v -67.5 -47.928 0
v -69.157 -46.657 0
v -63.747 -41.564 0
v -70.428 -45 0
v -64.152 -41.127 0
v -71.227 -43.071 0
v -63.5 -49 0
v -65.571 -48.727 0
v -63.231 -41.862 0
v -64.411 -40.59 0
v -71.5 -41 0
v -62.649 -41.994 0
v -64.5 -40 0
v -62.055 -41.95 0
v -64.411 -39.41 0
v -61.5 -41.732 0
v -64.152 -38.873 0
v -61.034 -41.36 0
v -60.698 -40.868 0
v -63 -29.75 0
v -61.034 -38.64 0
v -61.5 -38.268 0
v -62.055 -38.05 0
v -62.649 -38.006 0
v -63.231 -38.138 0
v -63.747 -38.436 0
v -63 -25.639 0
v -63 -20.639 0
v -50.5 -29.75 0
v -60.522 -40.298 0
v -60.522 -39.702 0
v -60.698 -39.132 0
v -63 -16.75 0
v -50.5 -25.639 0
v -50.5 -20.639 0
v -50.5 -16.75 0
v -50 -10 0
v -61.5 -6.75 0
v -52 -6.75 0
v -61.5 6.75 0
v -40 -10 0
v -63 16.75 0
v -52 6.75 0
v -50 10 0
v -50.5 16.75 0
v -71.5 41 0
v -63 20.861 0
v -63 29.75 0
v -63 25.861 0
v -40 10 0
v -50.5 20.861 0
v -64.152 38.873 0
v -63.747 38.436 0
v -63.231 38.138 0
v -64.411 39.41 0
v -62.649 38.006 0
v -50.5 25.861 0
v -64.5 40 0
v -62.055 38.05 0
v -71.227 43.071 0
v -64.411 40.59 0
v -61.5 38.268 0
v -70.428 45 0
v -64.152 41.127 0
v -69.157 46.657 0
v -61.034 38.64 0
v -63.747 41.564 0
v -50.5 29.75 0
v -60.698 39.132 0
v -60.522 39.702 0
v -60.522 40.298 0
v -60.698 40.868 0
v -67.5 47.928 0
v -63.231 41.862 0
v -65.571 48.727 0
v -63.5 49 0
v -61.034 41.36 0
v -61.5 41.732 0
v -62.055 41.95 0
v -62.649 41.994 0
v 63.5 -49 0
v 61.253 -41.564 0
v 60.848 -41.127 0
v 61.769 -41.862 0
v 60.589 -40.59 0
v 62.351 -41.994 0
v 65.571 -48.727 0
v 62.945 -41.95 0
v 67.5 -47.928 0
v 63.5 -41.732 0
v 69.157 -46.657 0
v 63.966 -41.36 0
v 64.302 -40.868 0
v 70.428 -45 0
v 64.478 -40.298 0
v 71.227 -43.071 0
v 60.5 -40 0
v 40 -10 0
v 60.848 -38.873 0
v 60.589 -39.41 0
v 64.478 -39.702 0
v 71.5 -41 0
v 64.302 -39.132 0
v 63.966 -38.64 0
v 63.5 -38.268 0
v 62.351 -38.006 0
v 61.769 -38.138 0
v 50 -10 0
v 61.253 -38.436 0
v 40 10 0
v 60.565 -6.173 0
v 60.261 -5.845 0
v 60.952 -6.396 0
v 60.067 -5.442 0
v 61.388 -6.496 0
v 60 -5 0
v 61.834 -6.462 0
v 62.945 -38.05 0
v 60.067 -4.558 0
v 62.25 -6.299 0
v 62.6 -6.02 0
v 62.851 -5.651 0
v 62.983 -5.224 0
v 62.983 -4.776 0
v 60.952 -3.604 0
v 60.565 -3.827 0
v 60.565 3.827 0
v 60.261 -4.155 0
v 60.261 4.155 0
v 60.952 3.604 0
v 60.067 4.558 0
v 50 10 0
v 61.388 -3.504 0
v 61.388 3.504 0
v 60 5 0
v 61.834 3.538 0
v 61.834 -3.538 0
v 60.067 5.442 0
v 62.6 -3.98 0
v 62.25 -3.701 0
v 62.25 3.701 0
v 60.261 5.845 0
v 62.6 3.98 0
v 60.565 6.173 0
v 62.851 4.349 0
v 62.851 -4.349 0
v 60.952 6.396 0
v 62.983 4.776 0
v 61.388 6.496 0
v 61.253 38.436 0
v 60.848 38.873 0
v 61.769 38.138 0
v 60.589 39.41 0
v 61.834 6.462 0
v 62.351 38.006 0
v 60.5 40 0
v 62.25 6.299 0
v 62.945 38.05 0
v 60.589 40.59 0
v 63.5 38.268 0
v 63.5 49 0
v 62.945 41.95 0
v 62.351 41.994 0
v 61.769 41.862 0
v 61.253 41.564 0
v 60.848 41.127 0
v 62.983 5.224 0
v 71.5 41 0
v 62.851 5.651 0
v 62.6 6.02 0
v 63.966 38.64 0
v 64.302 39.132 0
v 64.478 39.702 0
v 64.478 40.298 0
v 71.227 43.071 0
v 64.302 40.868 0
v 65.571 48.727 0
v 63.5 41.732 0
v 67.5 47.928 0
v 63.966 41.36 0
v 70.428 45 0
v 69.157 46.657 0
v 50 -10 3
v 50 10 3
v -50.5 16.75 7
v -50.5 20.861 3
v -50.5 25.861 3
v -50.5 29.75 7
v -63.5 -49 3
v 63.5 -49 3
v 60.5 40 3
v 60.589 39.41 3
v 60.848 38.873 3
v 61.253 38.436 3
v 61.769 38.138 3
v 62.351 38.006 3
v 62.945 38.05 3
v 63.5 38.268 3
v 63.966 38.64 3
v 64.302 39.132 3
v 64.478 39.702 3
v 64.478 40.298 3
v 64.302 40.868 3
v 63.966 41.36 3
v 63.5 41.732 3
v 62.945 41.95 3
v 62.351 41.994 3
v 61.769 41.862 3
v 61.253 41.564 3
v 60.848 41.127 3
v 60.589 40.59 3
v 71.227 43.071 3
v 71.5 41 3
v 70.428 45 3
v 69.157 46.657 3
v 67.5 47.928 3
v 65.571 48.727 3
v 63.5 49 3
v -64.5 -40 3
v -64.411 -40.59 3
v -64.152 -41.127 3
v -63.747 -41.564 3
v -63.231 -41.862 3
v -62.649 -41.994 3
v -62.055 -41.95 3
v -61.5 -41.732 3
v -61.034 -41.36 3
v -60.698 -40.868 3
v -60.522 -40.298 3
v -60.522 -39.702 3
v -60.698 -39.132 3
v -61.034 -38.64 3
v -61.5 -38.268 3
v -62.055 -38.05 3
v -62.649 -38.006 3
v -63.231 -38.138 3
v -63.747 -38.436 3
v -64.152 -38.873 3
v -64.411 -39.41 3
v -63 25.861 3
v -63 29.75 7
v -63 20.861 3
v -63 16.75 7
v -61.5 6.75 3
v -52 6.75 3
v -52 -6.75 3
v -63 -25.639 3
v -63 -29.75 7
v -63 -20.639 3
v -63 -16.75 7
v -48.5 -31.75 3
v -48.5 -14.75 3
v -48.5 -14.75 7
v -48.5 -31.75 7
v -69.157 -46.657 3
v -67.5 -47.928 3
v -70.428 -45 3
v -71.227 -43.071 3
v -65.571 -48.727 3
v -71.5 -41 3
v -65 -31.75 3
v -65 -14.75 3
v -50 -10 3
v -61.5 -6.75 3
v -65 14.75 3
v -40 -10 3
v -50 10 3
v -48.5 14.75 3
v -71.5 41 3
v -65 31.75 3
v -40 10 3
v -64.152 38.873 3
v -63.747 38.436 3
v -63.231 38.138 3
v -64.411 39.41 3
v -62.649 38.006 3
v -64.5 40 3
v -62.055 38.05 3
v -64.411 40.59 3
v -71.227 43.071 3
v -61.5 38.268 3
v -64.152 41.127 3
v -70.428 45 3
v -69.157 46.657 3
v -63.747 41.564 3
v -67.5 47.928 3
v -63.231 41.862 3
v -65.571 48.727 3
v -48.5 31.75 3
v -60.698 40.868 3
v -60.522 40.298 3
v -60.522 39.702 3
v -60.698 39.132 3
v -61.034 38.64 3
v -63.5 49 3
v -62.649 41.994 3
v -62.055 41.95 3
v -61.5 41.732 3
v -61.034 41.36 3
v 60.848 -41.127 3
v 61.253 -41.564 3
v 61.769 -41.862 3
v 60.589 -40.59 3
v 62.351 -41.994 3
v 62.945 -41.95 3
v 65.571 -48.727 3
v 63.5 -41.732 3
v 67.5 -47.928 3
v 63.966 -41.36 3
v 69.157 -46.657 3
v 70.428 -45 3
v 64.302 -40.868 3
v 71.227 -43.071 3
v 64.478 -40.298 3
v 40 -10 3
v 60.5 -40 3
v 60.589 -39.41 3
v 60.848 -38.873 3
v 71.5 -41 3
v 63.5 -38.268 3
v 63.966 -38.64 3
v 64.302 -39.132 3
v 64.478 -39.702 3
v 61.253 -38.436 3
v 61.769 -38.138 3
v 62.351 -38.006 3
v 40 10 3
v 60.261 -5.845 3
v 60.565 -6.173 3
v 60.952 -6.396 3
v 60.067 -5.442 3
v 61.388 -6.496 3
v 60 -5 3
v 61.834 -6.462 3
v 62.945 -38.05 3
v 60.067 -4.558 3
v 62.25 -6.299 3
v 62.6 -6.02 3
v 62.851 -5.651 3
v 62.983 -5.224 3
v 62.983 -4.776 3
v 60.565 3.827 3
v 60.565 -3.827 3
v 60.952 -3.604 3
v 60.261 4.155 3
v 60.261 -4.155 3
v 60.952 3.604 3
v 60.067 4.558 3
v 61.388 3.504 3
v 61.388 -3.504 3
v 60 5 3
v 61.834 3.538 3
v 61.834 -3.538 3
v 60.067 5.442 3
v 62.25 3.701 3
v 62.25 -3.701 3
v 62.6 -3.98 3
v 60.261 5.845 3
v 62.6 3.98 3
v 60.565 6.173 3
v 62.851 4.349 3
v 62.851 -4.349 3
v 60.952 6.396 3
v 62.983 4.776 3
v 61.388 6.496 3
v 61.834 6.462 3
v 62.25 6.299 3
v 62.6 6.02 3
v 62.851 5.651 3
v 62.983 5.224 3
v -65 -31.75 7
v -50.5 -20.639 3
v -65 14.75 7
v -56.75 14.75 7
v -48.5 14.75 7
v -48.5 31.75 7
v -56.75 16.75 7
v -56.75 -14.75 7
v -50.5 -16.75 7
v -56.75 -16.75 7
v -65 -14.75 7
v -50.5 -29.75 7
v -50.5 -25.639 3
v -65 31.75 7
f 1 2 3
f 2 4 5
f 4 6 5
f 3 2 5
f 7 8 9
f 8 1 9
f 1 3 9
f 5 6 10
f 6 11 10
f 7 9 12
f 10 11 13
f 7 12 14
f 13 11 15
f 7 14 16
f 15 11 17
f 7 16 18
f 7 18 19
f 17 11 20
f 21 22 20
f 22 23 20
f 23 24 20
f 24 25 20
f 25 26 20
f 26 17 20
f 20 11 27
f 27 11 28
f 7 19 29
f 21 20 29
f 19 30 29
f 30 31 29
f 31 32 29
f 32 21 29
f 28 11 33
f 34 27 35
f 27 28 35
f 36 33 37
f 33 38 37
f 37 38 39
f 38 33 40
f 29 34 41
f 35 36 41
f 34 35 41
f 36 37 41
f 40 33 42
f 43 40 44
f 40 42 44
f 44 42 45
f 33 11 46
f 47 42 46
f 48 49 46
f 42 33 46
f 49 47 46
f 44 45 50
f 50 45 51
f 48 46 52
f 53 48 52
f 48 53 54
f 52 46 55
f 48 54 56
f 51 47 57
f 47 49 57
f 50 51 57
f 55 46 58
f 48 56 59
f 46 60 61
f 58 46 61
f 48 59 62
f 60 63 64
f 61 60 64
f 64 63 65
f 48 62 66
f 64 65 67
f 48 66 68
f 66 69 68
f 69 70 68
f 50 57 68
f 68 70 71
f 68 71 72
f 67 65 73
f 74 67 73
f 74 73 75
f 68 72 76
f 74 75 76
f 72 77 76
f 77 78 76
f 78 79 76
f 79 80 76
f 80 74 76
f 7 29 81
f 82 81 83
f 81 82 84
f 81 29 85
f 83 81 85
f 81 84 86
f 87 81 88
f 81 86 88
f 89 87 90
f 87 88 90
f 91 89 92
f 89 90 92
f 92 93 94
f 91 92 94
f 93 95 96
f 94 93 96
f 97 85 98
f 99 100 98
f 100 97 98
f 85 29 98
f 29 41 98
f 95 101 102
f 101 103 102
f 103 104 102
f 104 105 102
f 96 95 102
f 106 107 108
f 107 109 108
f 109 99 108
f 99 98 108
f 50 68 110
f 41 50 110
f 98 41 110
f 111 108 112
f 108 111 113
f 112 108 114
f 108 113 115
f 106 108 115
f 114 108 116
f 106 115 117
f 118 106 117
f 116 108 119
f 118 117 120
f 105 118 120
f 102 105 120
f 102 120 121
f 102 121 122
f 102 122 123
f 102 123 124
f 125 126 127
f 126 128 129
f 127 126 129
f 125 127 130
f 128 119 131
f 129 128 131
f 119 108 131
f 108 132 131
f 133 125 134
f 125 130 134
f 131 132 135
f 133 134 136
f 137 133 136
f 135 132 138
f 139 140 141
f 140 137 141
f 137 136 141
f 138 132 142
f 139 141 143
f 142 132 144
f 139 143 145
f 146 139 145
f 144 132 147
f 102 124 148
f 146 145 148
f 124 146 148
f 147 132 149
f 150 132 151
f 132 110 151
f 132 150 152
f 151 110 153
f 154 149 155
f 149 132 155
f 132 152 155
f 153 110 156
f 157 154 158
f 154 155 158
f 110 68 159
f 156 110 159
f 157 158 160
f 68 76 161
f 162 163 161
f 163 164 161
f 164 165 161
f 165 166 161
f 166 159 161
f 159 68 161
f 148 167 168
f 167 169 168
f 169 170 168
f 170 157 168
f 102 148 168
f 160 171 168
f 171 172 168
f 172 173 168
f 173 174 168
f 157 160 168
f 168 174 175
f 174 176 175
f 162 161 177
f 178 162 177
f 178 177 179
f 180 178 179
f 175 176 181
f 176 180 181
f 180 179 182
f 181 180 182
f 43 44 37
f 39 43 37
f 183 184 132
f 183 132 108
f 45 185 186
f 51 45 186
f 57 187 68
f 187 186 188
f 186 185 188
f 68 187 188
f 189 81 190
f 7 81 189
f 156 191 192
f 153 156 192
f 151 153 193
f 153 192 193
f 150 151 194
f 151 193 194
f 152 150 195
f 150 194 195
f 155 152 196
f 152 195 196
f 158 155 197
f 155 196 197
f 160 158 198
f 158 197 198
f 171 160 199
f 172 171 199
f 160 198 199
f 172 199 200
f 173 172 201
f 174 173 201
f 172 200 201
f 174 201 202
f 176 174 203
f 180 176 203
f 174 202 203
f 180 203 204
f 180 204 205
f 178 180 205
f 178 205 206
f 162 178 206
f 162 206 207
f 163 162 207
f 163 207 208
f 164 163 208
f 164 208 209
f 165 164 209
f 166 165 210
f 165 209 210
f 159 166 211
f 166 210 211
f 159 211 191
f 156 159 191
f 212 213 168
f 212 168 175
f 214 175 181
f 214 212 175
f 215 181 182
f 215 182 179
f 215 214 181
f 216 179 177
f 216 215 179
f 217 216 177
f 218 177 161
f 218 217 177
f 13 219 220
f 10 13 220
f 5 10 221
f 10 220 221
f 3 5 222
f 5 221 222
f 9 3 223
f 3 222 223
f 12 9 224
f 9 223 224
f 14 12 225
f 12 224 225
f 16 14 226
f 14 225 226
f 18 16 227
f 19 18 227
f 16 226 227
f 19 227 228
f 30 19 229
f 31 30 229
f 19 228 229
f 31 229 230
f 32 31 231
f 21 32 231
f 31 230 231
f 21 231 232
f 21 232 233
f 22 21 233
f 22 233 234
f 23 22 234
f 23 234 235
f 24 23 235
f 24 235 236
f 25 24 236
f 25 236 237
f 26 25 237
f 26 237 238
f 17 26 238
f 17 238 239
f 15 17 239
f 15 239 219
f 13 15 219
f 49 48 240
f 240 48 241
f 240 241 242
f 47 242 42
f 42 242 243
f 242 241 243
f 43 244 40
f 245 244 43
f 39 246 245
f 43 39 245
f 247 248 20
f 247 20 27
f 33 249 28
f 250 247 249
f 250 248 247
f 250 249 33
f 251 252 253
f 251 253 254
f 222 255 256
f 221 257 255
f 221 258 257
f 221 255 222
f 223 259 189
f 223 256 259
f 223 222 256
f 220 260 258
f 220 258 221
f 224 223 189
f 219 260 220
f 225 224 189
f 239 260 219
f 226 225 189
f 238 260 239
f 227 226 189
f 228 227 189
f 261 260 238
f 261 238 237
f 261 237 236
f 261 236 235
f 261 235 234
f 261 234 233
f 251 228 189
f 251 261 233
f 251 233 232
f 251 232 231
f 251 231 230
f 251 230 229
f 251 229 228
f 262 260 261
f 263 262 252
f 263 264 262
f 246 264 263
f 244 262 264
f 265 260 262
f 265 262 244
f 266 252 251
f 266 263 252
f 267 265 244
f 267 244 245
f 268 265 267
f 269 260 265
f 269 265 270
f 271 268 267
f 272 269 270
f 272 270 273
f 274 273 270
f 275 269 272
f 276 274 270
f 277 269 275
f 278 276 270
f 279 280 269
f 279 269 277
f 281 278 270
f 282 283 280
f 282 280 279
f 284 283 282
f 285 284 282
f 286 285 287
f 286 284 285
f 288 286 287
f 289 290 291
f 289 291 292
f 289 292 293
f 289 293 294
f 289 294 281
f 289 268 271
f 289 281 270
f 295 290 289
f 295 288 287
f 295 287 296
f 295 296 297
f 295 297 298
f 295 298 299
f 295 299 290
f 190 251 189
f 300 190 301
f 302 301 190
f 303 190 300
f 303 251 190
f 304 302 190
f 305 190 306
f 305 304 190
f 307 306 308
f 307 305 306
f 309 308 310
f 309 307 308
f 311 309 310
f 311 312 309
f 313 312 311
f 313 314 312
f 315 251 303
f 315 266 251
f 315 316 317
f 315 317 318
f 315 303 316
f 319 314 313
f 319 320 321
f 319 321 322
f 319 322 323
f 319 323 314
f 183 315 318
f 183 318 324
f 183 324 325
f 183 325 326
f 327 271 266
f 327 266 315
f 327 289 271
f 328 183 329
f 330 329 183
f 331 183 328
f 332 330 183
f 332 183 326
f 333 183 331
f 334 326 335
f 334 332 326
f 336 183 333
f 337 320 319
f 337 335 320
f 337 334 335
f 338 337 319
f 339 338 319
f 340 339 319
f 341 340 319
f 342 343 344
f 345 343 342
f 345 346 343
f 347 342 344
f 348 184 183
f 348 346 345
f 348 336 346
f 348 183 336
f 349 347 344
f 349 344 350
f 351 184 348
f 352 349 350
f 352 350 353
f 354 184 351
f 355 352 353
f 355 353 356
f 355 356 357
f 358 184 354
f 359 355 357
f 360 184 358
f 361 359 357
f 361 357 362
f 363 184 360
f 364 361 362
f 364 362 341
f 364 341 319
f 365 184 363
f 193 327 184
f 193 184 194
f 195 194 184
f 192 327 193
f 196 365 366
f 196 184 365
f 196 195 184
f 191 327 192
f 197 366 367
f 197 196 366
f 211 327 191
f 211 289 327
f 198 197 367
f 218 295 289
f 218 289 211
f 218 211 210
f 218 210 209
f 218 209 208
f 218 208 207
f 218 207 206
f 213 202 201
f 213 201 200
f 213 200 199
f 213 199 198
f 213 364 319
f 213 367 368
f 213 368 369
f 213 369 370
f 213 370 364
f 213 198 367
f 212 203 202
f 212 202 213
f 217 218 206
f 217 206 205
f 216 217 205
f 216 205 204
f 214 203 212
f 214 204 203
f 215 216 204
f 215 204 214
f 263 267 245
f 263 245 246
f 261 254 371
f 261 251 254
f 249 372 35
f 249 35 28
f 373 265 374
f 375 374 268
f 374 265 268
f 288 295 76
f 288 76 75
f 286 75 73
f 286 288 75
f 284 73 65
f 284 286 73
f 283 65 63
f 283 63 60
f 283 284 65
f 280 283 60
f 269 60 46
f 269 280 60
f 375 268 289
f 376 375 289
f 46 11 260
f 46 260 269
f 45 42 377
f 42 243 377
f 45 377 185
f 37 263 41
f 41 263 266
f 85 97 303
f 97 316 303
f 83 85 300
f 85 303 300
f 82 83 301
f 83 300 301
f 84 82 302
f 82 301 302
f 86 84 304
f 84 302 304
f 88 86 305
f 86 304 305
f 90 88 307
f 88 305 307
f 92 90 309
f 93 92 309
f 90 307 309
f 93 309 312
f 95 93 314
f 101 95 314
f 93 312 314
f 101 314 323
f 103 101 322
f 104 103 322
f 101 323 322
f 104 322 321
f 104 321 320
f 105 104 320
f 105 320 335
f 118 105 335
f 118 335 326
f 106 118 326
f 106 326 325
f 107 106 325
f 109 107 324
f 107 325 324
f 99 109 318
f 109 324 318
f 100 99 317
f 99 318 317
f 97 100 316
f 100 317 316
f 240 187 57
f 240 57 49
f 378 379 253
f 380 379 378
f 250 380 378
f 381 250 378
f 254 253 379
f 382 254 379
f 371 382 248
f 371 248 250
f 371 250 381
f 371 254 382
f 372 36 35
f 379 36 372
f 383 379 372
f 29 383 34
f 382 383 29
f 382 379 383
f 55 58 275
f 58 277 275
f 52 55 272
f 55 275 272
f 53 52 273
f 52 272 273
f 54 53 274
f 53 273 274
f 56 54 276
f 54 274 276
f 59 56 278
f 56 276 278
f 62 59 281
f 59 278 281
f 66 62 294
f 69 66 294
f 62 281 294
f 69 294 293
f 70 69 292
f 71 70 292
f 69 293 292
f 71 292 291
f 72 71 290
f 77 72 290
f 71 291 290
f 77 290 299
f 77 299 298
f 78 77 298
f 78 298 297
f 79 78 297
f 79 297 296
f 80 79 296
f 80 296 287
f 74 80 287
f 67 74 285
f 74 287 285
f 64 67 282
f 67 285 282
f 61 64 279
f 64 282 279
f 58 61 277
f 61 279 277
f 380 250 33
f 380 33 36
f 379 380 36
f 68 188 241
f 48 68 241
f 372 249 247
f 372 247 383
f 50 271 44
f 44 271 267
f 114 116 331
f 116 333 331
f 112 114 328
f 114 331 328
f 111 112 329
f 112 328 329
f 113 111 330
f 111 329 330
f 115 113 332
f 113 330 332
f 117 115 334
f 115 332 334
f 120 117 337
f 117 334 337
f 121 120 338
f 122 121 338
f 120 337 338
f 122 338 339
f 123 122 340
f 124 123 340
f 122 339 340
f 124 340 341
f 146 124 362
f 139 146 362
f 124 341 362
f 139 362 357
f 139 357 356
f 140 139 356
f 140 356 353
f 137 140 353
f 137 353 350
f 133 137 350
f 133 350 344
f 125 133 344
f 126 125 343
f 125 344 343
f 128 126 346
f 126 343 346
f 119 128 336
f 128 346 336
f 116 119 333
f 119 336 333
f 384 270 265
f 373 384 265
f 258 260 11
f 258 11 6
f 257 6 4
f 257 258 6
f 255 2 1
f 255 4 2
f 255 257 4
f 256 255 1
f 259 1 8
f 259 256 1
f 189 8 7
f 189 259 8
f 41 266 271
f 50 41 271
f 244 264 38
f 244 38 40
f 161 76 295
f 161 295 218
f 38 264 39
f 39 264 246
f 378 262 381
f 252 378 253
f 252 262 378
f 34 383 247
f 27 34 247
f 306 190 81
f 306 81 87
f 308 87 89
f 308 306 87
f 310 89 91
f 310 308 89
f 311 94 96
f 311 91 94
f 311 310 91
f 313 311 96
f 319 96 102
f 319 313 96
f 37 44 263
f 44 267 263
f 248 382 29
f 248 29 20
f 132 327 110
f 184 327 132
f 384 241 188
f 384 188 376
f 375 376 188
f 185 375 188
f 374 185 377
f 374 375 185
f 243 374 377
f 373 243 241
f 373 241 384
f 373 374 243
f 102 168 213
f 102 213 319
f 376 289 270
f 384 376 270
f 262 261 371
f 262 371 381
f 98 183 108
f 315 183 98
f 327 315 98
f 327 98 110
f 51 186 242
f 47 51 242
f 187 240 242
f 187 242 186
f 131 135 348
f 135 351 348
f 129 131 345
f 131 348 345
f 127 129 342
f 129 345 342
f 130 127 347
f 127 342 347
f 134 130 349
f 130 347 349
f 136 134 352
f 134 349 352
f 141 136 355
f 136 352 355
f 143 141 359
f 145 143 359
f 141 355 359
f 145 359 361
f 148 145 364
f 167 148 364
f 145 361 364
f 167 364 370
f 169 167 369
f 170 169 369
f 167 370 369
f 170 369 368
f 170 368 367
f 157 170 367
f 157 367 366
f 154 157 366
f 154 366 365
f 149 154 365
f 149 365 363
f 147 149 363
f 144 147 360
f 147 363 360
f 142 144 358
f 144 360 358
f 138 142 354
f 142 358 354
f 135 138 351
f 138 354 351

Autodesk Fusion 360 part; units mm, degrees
sketch "Boceto1" plane through (0, 0, 0) normal (0, 0, 1) x (1, 0, 0)
  line L0 (71.5, 0) -> (-71.5, 0)
  line L1 (0, -49) -> (0, 49)
  line L2 (-71.5, 49) -> (71.5, 49)
  line L3 (71.5, 49) -> (71.5, -49)
  line L4 (71.5, -49) -> (-71.5, -49)
  line L5 (-71.5, -49) -> (-71.5, 49)
  line L6 (-71.5, 49) -> (71.5, -49) construction
  line L7 (71.5, 49) -> (-71.5, -49) construction
  dimension "d1" = 143
  dimension "d2" = 98
extrude "Extruir1" add sketch "Boceto1" along normal blind 3
sketch "Boceto2" plane through (0, 0, 3) normal (0, 0, 1) x (-1, 0, 0)
  line L0 (71.5, 49) -> (-71.5, 49)
  line L1 (-71.5, 49) -> (-71.5, -49)
  line L2 (-71.5, -49) -> (71.5, -49)
  line L3 (71.5, -49) -> (71.5, 49)
  line L4 (71.5, -49) -> (62.5, -49)
  line L5 (62.5, -49) -> (62.5, -40)
  line L6 (71.5, 49) -> (62.5, 49)
  line L7 (62.5, 49) -> (62.5, 40)
  line L8 (-71.5, 49) -> (-71.5, 40)
  line L9 (-71.5, 40) -> (-62.5, 40)
  line L10 (-71.5, -49) -> (-62.5, -49)
  line L11 (-62.5, -49) -> (-62.5, -40)
  circle A0 centre (62.5, -40) radius 2
  circle A1 centre (62.5, 40) radius 2
  circle A2 centre (-62.5, -40) radius 2
  circle A3 centre (-62.5, 40) radius 2
  dimension "d7" = 9
  dimension "d8" = 9
  dimension "d9" = 9
  dimension "d10" = 9
  dimension "d11" = 9
  dimension "d12" = 9
  dimension "d13" = 9
  dimension "d14" = 9
  dimension "d15" = 4
  dimension "d16" = 4
  dimension "d17" = 4
  dimension "d18" = 4
extrude "Extruir2" cut sketch "Boceto2" against normal blind 3 contours A1 | A3 | A2 | A0
fillet "Empalme2" radius 8 4 edges at (-71.5, -49, 1.5) (-71.5, 49, 1.5) (71.5, -49, 1.5) (71.5, 49, 1.5)
sketch "Boceto3" plane through (0, 0, 3) normal (0, 0, 1) x (-1, 0, 0)
  circle A0 centre (62.5, 40) radius 2
  circle A1 centre (-62.5, -40) radius 2
  circle A2 centre (62.5, -40) radius 2
  circle A3 centre (-62.5, 40) radius 2
  arc A4 (-71.5, -41) -> (-63.5, -49) centre (-63.5, -41) ccw
  line L0 (-63.5, -49) -> (63.5, -49)
  arc A5 (63.5, -49) -> (71.5, -41) centre (63.5, -41) ccw
  line L1 (71.5, -41) -> (71.5, 41)
  arc A6 (71.5, 41) -> (63.5, 49) centre (63.5, 41) ccw
  line L2 (63.5, 49) -> (-63.5, 49)
  arc A7 (-63.5, 49) -> (-71.5, 41) centre (-63.5, 41) ccw
  line L3 (-71.5, 41) -> (-71.5, -41)
  line L4 (-40, 0) -> (40, 0)
  line L5 (40, 10) -> (40, -10)
  line L6 (-40, 10) -> (-40, -10)
  line L7 (40, -10) -> (50, -10)
  line L8 (50, -10) -> (50, 10)
  line L9 (50, 10) -> (40, 10)
  line L10 (40, 10) -> (40, -10)
  line L11 (-40, -10) -> (-50, -10)
  line L12 (-50, -10) -> (-50, 10)
  line L13 (-50, 10) -> (-40, 10)
  line L14 (-40, 10) -> (-40, -10)
  dimension "d23" = 80
  dimension "d24" = 20
  dimension "d25" = 20
  dimension "d26" = 10
  dimension "d27" = 20
  dimension "d28" = 10
  dimension "d29" = 20
extrude "Extruir3" cut sketch "Boceto3" against normal blind 3 contours L5 L7 L8 L9 L10 | L6 L11 L12 L13 L14
sketch "Boceto4" plane through (0, 0, 3) normal (0, 0, 1) x (-1, 0, 0)
  line L0 (50, -10) -> (40, -10)
  line L1 (40, -10) -> (40, 10)
  line L2 (40, 10) -> (50, 10)
  line L3 (50, 10) -> (50, -10)
  line L4 (-50, -10) -> (-50, 10)
  line L5 (-50, 10) -> (-40, 10)
  line L6 (-40, 10) -> (-40, -10)
  line L7 (-40, -10) -> (-50, -10)
  circle A0 centre (62.5, 40) radius 2
  circle A1 centre (-62.5, -40) radius 2
  circle A2 centre (62.5, -40) radius 2
  circle A3 centre (-62.5, 40) radius 2
  arc A4 (-71.5, -41) -> (-63.5, -49) centre (-63.5, -41) ccw
  line L8 (-63.5, -49) -> (63.5, -49)
  arc A5 (63.5, -49) -> (71.5, -41) centre (63.5, -41) ccw
  line L9 (71.5, -41) -> (71.5, 41)
  arc A6 (71.5, 41) -> (63.5, 49) centre (63.5, 41) ccw
  line L10 (63.5, 49) -> (-63.5, 49)
  arc A7 (-63.5, 49) -> (-71.5, 41) centre (-63.5, 41) ccw
  line L11 (-71.5, 41) -> (-71.5, -41)
  line L12 (71.5, 0) -> (61.5, 0)
  line L13 (61.5, 6.75) -> (61.5, -6.75)
  line L14 (61.5, -6.75) -> (52, -6.75)
  line L15 (61.5, 6.75) -> (52, 6.75)
  line L16 (52, 6.75) -> (52, -6.75)
  dimension "d32" = 10
  dimension "d33" = 13.5
  dimension "d34" = 9.5
  dimension "d35" = 9.5
extrude "Extruir4" cut sketch "Boceto4" against normal blind 3 contours L13 L14 L15 L16
sketch "Boceto5" plane through (0, 0, 3) normal (0, 0, 1) x (-1, 0, 0)
  line L0 (52, -6.75) -> (52, 6.75)
  line L1 (52, 6.75) -> (61.5, 6.75)
  line L2 (61.5, 6.75) -> (61.5, -6.75)
  line L3 (61.5, -6.75) -> (52, -6.75)
  line L4 (50, -10) -> (40, -10)
  line L5 (40, -10) -> (40, 10)
  line L6 (40, 10) -> (50, 10)
  line L7 (50, 10) -> (50, -10)
  line L8 (-50, -10) -> (-50, 10)
  line L9 (-50, 10) -> (-40, 10)
  line L10 (-40, 10) -> (-40, -10)
  line L11 (-40, -10) -> (-50, -10)
  circle A0 centre (62.5, 40) radius 2
  circle A1 centre (-62.5, -40) radius 2
  circle A2 centre (62.5, -40) radius 2
  circle A3 centre (-62.5, 40) radius 2
  arc A4 (-71.5, -41) -> (-63.5, -49) centre (-63.5, -41) ccw
  line L12 (-63.5, -49) -> (63.5, -49)
  arc A5 (63.5, -49) -> (71.5, -41) centre (63.5, -41) ccw
  line L13 (71.5, -41) -> (71.5, 41)
  arc A6 (71.5, 41) -> (63.5, 49) centre (63.5, 41) ccw
  line L14 (63.5, 49) -> (-63.5, 49)
  arc A7 (-63.5, 49) -> (-71.5, 41) centre (-63.5, 41) ccw
  line L15 (-71.5, 41) -> (-71.5, -41)
  line L16 (56.75, 6.75) -> (56.75, 16.75)
  line L17 (56.75, -6.75) -> (56.75, -16.75)
  line L18 (63, 16.75) -> (50.5, 16.75)
  line L19 (63, -16.75) -> (50.5, -16.75)
  line L20 (50.5, 16.75) -> (50.5, 29.75)
  line L21 (50.5, -16.75) -> (50.5, -29.75)
  line L22 (50.5, -29.75) -> (63, -29.75)
  line L23 (63, -29.75) -> (63, -16.75)
  line L24 (50.5, 29.75) -> (63, 29.75)
  line L25 (63, 29.75) -> (63, 16.75)
  line L26 (50.5, 25.6389) -> (50.5, 20.6389)
  line L27 (50.5, -20.8611) -> (50.5, -25.8611)
  line L28 (50.5, -25.8611) -> (63, -25.8611)
  line L29 (50.5, -20.8611) -> (63, -20.8611)
  line L30 (50.5, 20.6389) -> (63, 20.6389)
  line L31 (50.5, 25.6389) -> (63, 25.6389)
  line L32 (65, -31.75) -> (65, -14.75)
  line L33 (65, -14.75) -> (48.5, -14.75)
  line L34 (48.5, -14.75) -> (48.5, -31.75)
  line L35 (48.5, -31.75) -> (65, -31.75)
  line L36 (65, 31.75) -> (65, 14.75)
  line L37 (65, 14.75) -> (48.5, 14.75)
  line L38 (48.5, 14.75) -> (48.5, 31.75)
  line L39 (48.5, 31.75) -> (65, 31.75)
  point P0 (50.5, 23.1389)
  point P1 (50.5, -23.3611)
  dimension "d38" = 10
  dimension "d39" = 10
  dimension "d40" = 12.5
  dimension "d41" = 12.5
  dimension "d42" = 13
  dimension "d43" = 13
  dimension "d44" = 12.5
  dimension "d45" = 12.5
  dimension "d46" = 5
  dimension "d47" = 5
  dimension "d48" = 2
  dimension "d49" = -2
extrude "Extruir5" add sketch "Boceto5" along normal blind 4 contours L36 L37 L38 L39 | L32 L33 L34 L35
extrude "Extruir6" cut sketch "Boceto5" against normal blind 3 contours L18 L20 L25 L30 | L19 L21 L23 L29 | L21 L22 L23 L28 | L20 L24 L25 L31
sketch "Boceto6" plane through (0, 0, 3) normal (0, 0, 1) x (-1, 0, 0)
  line L0 (48.5, -31.75) -> (48.5, -14.75)
  line L1 (48.5, -14.75) -> (65, -14.75)
  line L2 (65, -14.75) -> (65, -31.75)
  line L3 (65, -31.75) -> (48.5, -31.75)
  line L4 (52, -6.75) -> (52, 6.75)
  line L5 (52, 6.75) -> (61.5, 6.75)
  line L6 (61.5, 6.75) -> (61.5, -6.75)
  line L7 (61.5, -6.75) -> (52, -6.75)
  line L8 (50, -10) -> (40, -10)
  line L9 (40, -10) -> (40, 10)
  line L10 (40, 10) -> (50, 10)
  line L11 (50, 10) -> (50, -10)
  line L12 (-50, -10) -> (-50, 10)
  line L13 (-50, 10) -> (-40, 10)
  line L14 (-40, 10) -> (-40, -10)
  line L15 (-40, -10) -> (-50, -10)
  circle A0 centre (62.5, 40) radius 2
  circle A1 centre (-62.5, -40) radius 2
  circle A2 centre (62.5, -40) radius 2
  circle A3 centre (-62.5, 40) radius 2
  arc A4 (-71.5, -41) -> (-63.5, -49) centre (-63.5, -41) ccw
  line L16 (-63.5, -49) -> (63.5, -49)
  arc A5 (63.5, -49) -> (71.5, -41) centre (63.5, -41) ccw
  line L17 (71.5, -41) -> (71.5, 41)
  arc A6 (71.5, 41) -> (63.5, 49) centre (63.5, 41) ccw
  line L18 (63.5, 49) -> (-63.5, 49)
  arc A7 (-63.5, 49) -> (-71.5, 41) centre (-63.5, 41) ccw
  line L19 (-71.5, 41) -> (-71.5, -41)
  line L20 (48.5, 31.75) -> (65, 31.75)
  line L21 (65, 31.75) -> (65, 14.75)
  line L22 (65, 14.75) -> (48.5, 14.75)
  line L23 (48.5, 14.75) -> (48.5, 31.75)
  line L24 (-71.5, 0) -> (-61.5, 0)
  line L25 (-61.5, -5) -> (-61.5, 5)
  circle A8 centre (-61.5, 5) radius 1.5
  circle A9 centre (-61.5, -5) radius 1.5
  dimension "d54" = 10
  dimension "d55" = 10
  dimension "d56" = 3
  dimension "d57" = 3
extrude "Extruir7" cut sketch "Boceto6" against normal blind 3 contours A8 | A9
